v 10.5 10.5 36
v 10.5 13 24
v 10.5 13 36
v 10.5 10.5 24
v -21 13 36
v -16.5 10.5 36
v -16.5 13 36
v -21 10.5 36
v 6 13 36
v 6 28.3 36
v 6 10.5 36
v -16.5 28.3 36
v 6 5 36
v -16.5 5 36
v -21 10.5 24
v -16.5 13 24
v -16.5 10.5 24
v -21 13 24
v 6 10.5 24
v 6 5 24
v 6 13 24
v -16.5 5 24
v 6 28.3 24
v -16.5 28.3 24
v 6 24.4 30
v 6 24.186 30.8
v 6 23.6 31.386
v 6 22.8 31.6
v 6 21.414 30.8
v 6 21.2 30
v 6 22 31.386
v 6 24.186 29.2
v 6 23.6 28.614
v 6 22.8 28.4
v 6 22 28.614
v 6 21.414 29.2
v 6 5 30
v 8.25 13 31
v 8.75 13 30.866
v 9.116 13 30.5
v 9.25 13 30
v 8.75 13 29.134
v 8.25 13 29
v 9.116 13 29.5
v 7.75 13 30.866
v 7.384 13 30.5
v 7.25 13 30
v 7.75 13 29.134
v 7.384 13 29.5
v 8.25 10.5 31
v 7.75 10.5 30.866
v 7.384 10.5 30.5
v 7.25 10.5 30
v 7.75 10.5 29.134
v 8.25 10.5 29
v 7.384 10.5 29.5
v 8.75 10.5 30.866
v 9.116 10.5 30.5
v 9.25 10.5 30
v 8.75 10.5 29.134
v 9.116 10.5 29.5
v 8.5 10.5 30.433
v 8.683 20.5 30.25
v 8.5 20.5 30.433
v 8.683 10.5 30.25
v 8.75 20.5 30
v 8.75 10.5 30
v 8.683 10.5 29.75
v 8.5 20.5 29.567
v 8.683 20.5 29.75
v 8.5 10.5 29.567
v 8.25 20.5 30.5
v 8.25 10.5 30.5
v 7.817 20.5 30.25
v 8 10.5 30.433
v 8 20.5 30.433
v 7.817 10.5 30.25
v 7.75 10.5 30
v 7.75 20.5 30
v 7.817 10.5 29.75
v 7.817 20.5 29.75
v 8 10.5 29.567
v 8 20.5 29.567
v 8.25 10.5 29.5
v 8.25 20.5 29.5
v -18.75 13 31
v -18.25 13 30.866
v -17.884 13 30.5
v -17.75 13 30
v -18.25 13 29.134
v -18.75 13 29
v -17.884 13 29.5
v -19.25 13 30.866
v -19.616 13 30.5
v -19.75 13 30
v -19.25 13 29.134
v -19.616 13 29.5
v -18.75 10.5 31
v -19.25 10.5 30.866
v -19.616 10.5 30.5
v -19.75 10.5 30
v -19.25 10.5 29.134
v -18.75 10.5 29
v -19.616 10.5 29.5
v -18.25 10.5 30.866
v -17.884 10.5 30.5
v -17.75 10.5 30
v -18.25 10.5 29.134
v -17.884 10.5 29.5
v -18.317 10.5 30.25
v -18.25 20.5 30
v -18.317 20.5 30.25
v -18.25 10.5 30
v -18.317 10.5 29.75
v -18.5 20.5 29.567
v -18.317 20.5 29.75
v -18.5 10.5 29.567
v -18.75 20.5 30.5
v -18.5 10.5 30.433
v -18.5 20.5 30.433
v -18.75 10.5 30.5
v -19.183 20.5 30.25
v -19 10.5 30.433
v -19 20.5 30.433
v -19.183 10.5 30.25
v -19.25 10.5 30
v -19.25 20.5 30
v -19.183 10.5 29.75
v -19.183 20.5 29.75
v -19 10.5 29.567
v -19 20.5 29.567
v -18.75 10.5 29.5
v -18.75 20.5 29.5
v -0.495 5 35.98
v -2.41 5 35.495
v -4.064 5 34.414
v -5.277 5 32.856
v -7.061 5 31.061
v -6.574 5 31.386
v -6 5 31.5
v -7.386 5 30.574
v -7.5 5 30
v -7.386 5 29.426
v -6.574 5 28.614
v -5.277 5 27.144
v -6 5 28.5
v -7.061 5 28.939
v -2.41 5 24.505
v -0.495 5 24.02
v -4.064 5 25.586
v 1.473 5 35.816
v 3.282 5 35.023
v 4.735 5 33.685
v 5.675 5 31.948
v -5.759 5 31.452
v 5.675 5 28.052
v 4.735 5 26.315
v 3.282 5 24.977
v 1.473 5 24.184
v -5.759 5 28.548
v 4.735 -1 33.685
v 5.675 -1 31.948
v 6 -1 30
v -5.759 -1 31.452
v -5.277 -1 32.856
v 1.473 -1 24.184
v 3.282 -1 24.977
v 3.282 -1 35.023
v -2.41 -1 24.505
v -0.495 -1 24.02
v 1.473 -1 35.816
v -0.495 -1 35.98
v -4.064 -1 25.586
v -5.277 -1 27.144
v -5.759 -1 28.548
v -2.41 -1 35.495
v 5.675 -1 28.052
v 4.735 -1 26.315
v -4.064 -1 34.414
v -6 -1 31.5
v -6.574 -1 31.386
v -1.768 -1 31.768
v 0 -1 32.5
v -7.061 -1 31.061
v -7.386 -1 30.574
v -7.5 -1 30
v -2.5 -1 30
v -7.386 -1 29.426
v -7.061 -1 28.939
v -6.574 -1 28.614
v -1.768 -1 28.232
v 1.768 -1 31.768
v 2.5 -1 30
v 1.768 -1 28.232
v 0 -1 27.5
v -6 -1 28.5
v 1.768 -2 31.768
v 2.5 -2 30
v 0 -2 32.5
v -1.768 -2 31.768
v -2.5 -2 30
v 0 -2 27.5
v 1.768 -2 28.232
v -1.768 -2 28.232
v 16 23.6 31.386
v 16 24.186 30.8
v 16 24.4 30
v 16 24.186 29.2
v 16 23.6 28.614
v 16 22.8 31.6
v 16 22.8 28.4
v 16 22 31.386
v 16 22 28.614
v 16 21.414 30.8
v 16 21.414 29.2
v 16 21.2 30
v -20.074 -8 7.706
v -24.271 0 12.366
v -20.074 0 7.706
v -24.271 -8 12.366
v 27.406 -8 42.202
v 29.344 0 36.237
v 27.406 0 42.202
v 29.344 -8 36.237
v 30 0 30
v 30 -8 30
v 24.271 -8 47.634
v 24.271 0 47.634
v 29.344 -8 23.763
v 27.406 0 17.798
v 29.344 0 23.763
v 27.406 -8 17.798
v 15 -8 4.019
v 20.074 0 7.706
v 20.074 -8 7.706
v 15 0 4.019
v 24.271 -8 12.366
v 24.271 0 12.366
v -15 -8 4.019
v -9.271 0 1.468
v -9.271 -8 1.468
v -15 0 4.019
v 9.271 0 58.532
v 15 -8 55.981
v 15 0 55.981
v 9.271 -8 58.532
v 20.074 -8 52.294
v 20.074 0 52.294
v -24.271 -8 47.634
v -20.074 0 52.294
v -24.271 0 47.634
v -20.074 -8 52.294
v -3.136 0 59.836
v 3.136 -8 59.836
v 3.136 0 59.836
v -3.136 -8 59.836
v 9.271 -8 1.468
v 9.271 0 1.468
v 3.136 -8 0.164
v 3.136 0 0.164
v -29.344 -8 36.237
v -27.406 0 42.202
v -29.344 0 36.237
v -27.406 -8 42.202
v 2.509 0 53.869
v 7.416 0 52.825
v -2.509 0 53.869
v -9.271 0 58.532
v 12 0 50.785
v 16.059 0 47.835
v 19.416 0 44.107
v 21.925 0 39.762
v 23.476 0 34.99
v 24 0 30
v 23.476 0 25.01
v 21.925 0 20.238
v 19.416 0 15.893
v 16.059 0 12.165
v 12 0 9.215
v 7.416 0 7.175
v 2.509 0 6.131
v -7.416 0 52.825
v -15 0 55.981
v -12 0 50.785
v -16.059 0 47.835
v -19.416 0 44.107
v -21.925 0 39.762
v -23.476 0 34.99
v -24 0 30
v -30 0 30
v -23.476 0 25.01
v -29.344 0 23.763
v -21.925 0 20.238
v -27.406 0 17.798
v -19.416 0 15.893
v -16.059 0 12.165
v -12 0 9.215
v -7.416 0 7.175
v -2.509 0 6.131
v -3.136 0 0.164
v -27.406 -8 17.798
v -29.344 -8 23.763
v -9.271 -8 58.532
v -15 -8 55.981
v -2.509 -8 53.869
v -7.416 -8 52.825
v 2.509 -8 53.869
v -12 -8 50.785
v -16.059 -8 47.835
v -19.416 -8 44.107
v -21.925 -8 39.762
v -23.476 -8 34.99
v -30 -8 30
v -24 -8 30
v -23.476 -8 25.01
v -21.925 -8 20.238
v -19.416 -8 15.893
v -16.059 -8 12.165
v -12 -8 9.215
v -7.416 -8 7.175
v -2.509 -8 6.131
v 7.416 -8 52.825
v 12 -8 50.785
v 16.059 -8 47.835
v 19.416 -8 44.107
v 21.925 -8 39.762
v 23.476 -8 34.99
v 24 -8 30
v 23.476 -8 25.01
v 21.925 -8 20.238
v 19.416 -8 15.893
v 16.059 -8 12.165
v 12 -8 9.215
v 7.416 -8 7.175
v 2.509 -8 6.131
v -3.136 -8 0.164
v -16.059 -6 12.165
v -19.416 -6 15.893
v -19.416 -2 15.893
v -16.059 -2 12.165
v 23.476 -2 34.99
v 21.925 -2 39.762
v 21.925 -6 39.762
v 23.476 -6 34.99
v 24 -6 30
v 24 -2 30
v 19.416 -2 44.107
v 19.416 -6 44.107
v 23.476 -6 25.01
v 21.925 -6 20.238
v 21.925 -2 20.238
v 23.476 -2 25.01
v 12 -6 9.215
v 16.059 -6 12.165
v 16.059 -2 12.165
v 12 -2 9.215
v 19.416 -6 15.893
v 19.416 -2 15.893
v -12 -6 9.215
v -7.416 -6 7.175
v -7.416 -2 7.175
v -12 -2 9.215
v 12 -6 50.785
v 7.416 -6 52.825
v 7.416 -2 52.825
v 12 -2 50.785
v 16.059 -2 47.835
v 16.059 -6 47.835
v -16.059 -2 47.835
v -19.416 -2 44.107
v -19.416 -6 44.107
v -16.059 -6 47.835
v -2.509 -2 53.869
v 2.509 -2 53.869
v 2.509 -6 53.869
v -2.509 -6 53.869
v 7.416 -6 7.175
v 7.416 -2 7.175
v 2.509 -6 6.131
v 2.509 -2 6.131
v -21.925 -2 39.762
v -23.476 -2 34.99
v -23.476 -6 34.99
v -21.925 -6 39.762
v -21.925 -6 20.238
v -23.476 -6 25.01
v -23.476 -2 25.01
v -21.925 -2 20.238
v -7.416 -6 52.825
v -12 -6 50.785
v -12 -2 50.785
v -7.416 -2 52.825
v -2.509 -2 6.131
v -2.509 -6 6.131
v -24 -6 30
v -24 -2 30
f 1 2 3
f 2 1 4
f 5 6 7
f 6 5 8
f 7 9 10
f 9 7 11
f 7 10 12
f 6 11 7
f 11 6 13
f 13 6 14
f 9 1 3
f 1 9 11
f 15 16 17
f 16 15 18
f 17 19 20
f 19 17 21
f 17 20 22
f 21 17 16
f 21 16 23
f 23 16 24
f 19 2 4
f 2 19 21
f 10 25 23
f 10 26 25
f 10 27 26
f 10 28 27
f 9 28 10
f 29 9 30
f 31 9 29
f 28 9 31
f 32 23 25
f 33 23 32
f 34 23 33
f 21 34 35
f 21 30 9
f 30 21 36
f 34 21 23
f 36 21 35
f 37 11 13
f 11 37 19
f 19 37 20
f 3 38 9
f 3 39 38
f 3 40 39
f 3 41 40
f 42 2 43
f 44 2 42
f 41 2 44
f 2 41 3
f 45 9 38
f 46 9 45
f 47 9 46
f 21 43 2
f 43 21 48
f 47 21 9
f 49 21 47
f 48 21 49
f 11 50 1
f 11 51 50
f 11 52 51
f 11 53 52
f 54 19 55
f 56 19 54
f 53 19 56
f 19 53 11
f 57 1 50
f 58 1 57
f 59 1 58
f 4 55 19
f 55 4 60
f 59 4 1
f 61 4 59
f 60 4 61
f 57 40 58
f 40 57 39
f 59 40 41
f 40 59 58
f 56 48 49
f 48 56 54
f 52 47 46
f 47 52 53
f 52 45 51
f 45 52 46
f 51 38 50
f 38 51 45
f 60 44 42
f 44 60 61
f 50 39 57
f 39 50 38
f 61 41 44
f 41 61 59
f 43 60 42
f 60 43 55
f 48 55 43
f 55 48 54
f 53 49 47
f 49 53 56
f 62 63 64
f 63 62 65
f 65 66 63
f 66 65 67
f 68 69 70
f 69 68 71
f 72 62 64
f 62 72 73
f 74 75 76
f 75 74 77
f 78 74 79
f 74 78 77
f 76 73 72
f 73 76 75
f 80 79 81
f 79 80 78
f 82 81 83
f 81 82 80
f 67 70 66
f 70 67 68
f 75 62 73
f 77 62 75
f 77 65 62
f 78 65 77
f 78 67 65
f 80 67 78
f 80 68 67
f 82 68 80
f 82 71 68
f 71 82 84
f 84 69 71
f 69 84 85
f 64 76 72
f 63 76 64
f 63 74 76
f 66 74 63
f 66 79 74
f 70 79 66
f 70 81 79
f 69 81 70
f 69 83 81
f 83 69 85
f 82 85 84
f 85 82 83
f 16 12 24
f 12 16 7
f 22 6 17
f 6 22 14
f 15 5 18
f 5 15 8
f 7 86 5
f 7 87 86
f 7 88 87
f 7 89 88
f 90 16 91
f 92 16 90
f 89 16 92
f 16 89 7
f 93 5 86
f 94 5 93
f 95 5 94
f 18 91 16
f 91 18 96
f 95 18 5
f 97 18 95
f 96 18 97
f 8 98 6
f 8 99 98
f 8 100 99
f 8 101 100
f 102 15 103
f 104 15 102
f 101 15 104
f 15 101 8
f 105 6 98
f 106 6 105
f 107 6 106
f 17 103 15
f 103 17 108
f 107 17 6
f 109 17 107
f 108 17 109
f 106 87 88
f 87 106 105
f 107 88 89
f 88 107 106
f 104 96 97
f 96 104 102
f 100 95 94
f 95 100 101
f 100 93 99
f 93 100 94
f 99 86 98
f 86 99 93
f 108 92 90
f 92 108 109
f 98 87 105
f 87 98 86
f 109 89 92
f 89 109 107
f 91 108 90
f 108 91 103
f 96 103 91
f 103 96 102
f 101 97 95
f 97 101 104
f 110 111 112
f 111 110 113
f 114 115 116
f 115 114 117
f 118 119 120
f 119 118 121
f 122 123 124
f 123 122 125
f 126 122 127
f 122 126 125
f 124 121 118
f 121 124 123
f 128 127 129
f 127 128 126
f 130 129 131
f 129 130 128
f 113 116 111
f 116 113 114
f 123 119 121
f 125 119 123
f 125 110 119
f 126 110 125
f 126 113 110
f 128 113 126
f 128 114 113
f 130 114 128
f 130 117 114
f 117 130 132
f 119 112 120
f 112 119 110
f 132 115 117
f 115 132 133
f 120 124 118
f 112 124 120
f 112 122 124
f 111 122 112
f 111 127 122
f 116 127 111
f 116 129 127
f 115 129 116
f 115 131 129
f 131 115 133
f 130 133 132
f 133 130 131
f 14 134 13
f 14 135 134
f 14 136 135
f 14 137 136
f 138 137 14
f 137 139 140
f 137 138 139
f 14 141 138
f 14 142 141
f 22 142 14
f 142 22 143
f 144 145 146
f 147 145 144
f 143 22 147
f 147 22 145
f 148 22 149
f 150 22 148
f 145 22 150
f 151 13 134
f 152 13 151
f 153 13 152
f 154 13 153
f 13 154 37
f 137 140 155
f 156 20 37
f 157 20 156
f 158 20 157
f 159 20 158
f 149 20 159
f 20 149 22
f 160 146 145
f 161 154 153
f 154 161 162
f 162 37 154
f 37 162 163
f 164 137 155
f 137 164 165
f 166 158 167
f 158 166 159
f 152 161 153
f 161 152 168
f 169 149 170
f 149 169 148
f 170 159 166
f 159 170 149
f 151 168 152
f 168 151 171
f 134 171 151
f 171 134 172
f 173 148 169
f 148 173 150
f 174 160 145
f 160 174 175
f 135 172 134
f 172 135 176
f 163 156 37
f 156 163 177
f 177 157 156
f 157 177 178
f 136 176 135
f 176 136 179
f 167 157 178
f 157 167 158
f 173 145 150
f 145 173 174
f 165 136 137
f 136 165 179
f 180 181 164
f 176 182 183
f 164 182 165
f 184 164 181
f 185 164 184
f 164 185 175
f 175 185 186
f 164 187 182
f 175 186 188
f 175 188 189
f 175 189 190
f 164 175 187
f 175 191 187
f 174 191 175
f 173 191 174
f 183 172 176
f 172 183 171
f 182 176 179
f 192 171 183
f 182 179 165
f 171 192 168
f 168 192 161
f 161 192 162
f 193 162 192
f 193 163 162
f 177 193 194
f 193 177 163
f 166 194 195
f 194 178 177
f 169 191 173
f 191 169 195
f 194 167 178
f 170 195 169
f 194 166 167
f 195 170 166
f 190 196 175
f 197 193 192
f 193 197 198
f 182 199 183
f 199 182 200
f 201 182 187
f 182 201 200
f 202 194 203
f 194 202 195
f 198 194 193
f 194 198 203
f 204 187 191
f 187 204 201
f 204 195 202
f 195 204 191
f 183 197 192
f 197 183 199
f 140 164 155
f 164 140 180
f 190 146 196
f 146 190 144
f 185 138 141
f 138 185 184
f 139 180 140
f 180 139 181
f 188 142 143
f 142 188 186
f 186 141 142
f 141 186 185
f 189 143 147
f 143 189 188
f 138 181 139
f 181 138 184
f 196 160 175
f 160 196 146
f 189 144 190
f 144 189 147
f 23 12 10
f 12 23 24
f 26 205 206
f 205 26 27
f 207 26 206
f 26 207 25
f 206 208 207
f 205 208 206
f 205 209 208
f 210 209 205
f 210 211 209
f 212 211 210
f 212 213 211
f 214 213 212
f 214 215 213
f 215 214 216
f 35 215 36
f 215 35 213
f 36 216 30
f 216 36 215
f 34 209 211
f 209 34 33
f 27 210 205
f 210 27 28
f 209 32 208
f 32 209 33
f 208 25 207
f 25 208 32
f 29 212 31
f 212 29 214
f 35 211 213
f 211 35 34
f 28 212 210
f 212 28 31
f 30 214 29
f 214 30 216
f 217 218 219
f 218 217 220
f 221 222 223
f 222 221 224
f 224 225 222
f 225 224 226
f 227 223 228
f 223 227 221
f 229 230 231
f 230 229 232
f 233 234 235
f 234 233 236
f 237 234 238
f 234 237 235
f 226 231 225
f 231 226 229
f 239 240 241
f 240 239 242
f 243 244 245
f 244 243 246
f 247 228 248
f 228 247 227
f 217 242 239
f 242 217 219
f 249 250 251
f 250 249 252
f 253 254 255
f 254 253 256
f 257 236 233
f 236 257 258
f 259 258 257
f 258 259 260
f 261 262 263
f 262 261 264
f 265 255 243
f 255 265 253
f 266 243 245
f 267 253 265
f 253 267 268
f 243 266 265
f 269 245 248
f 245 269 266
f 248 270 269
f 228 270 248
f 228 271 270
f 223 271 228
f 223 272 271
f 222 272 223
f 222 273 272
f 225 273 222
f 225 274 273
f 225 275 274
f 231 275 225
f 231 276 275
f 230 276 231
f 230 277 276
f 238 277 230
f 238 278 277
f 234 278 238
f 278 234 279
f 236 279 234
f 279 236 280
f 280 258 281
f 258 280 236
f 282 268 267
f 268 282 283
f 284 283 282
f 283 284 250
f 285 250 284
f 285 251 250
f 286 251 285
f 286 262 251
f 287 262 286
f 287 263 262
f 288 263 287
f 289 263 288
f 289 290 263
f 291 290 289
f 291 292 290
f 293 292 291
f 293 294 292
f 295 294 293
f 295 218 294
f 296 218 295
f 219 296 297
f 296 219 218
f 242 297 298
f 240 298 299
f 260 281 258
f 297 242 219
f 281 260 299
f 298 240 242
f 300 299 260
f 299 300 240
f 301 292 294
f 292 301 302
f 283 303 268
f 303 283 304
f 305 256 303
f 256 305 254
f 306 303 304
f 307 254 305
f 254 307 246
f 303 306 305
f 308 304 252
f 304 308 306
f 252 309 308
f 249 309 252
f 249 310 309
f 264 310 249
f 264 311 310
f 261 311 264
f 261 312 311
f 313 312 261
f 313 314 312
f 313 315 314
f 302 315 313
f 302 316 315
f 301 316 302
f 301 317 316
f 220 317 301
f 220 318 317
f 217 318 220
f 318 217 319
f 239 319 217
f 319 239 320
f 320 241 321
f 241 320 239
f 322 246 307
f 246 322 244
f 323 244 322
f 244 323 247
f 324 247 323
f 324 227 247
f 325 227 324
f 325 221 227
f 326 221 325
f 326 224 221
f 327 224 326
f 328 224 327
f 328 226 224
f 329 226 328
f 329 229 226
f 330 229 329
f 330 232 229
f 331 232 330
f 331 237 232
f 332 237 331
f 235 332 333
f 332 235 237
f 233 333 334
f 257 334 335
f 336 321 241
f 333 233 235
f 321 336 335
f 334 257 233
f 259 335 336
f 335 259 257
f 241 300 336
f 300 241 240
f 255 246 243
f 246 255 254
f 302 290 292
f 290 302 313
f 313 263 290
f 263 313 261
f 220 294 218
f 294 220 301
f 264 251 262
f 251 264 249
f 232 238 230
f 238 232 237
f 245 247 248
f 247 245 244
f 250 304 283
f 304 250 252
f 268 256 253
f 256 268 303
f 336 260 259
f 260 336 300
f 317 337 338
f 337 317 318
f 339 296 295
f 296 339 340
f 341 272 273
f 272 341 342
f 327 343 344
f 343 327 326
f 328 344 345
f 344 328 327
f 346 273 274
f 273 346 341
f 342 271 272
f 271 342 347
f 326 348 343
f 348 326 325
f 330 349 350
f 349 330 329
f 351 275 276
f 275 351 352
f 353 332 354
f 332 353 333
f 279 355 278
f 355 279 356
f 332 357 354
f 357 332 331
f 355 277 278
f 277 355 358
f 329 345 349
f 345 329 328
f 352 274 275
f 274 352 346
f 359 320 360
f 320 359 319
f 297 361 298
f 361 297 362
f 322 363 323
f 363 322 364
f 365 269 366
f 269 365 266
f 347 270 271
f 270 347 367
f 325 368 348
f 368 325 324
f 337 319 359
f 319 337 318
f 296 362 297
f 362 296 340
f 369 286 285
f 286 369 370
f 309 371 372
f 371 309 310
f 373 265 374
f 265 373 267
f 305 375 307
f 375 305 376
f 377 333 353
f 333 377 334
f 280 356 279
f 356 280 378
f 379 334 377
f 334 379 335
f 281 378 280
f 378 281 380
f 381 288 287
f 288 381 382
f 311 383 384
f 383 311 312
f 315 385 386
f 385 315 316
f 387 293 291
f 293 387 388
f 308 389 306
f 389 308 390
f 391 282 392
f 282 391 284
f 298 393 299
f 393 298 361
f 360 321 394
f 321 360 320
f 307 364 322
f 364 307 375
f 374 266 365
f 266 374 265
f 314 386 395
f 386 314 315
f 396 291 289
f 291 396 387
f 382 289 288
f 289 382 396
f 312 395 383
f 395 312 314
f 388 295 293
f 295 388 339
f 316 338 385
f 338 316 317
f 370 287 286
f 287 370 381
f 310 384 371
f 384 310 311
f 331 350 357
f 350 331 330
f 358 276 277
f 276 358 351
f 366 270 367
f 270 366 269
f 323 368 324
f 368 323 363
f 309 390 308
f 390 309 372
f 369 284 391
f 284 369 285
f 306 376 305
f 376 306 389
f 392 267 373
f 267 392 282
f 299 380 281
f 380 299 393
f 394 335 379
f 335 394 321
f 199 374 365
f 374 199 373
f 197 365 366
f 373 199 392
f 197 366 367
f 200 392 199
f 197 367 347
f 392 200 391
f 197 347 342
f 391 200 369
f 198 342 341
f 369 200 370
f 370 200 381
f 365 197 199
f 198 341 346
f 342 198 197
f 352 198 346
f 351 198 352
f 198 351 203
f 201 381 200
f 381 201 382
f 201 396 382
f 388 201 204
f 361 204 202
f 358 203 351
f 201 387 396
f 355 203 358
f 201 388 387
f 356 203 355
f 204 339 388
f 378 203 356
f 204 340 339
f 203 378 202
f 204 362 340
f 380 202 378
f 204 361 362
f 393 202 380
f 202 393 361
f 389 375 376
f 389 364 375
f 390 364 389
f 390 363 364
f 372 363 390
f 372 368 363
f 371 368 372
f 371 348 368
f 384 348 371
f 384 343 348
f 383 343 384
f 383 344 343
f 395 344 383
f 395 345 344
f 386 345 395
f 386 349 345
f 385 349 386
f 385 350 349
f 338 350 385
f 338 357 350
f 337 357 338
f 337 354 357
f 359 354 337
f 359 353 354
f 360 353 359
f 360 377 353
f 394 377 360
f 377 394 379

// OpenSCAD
    box_width=22.5;
    box_depth=23.3;
    box_height=12;
    cylinder_depth=6;
    small_cylinder=3;
    cylinders_width=15;
    gear_radius=2.5;
    gear_height=3;
    fixation_depth=2.5;
    fixation_width=4.5;
    fixation_depth_position=5.5;
    vis_hole=1;
    screw_radius=0.5;
    screw_long=10;
    cable_radius=1.6;
    cable_depth=5.5;


    wheel_depth=8;
    wheel_height=6;
    wheel_radius=30;
    wheel_depth_int=4;
    wheel_gear=2;


function wheelRadius() = wheel_radius;


module servo(with_screw=false,with_cable=false,axe_center=true) {        
    //big cylinder
    translate([box_width-box_height/2,0,box_height/2]){
        rotate([90,0,0]){
            cylinder(cylinder_depth,box_height/2,box_height/2);
        }
    }
    //gear
    translate([box_width-box_height/2,-cylinder_depth,box_height/2]){
        rotate([90,0,0]){
            cylinder(gear_height,gear_radius,gear_radius);
        }
    }
    //small cylinder
    translate([box_width-(cylinders_width-small_cylinder),0,box_height/2]){
        rotate([90,0,0]){
            cylinder(cylinder_depth,small_cylinder/2,small_cylinder/2,$fn=16);
        }
    }
    //box
    cube([box_width,box_depth,box_height]);
    
    //fixation droite
    translate([box_width,fixation_depth_position,0]){
        difference() {
            cube([fixation_width,fixation_depth,box_height]);
            translate([fixation_width/2,fixation_depth,box_height/2]){
                rotate([90,0,0]){
                    cylinder(fixation_depth,vis_hole,vis_hole,$fn=12);
                }
            }
        }
        if (with_screw) {
            translate([fixation_width/2,screw_long,box_height/2]){
                rotate([90,0,0]){
                    #cylinder(screw_long,screw_radius,screw_radius,$fn=12);
                }
            }
        }
    }
    //fixation gauche
    translate([-fixation_width,fixation_depth_position,0]){
        difference() {
            cube([fixation_width,fixation_depth,box_height]);
            translate([fixation_width/2,fixation_depth,box_height/2]){
                rotate([90,0,0]){
                    cylinder(fixation_depth,vis_hole,vis_hole,$fn=12);
                }
            }
        }
        if (with_screw) {
            translate([fixation_width/2,screw_long,box_height/2]){
                rotate([90,0,0]){
                    #cylinder(screw_long,screw_radius,screw_radius,$fn=12);
                }
            }
        }
    }
    if (with_cable) {
        translate([box_width,box_depth-cable_depth,box_height/2]){
            rotate([90,0,90]){
                cylinder(10,cable_radius,cable_radius,$fn=12);
            }
        }
    }
}

module wheel() {    
    translate([0,0,wheel_radius]){
        rotate([90,0,0]){
            difference() {
                cylinder(wheel_depth,wheel_radius,wheel_radius);
                cylinder(wheel_depth,wheel_radius-wheel_height,wheel_radius-wheel_height);
            }
            translate([0,0,(wheel_depth-wheel_depth_int)/2]){
                cylinder(wheel_depth_int,wheel_radius-wheel_height,wheel_radius-wheel_height);
            }
        }
    }
}


module servo_wheel(with_screw=false,with_cable=false) {
    translate([-(box_width-box_height/2), (cylinder_depth+gear_height)-(wheel_depth-wheel_depth_int)/2-wheel_gear,wheel_radius-box_height/2]){
        servo(with_screw,with_cable);
    }

    wheel();
}

servo_wheel(true,true);
